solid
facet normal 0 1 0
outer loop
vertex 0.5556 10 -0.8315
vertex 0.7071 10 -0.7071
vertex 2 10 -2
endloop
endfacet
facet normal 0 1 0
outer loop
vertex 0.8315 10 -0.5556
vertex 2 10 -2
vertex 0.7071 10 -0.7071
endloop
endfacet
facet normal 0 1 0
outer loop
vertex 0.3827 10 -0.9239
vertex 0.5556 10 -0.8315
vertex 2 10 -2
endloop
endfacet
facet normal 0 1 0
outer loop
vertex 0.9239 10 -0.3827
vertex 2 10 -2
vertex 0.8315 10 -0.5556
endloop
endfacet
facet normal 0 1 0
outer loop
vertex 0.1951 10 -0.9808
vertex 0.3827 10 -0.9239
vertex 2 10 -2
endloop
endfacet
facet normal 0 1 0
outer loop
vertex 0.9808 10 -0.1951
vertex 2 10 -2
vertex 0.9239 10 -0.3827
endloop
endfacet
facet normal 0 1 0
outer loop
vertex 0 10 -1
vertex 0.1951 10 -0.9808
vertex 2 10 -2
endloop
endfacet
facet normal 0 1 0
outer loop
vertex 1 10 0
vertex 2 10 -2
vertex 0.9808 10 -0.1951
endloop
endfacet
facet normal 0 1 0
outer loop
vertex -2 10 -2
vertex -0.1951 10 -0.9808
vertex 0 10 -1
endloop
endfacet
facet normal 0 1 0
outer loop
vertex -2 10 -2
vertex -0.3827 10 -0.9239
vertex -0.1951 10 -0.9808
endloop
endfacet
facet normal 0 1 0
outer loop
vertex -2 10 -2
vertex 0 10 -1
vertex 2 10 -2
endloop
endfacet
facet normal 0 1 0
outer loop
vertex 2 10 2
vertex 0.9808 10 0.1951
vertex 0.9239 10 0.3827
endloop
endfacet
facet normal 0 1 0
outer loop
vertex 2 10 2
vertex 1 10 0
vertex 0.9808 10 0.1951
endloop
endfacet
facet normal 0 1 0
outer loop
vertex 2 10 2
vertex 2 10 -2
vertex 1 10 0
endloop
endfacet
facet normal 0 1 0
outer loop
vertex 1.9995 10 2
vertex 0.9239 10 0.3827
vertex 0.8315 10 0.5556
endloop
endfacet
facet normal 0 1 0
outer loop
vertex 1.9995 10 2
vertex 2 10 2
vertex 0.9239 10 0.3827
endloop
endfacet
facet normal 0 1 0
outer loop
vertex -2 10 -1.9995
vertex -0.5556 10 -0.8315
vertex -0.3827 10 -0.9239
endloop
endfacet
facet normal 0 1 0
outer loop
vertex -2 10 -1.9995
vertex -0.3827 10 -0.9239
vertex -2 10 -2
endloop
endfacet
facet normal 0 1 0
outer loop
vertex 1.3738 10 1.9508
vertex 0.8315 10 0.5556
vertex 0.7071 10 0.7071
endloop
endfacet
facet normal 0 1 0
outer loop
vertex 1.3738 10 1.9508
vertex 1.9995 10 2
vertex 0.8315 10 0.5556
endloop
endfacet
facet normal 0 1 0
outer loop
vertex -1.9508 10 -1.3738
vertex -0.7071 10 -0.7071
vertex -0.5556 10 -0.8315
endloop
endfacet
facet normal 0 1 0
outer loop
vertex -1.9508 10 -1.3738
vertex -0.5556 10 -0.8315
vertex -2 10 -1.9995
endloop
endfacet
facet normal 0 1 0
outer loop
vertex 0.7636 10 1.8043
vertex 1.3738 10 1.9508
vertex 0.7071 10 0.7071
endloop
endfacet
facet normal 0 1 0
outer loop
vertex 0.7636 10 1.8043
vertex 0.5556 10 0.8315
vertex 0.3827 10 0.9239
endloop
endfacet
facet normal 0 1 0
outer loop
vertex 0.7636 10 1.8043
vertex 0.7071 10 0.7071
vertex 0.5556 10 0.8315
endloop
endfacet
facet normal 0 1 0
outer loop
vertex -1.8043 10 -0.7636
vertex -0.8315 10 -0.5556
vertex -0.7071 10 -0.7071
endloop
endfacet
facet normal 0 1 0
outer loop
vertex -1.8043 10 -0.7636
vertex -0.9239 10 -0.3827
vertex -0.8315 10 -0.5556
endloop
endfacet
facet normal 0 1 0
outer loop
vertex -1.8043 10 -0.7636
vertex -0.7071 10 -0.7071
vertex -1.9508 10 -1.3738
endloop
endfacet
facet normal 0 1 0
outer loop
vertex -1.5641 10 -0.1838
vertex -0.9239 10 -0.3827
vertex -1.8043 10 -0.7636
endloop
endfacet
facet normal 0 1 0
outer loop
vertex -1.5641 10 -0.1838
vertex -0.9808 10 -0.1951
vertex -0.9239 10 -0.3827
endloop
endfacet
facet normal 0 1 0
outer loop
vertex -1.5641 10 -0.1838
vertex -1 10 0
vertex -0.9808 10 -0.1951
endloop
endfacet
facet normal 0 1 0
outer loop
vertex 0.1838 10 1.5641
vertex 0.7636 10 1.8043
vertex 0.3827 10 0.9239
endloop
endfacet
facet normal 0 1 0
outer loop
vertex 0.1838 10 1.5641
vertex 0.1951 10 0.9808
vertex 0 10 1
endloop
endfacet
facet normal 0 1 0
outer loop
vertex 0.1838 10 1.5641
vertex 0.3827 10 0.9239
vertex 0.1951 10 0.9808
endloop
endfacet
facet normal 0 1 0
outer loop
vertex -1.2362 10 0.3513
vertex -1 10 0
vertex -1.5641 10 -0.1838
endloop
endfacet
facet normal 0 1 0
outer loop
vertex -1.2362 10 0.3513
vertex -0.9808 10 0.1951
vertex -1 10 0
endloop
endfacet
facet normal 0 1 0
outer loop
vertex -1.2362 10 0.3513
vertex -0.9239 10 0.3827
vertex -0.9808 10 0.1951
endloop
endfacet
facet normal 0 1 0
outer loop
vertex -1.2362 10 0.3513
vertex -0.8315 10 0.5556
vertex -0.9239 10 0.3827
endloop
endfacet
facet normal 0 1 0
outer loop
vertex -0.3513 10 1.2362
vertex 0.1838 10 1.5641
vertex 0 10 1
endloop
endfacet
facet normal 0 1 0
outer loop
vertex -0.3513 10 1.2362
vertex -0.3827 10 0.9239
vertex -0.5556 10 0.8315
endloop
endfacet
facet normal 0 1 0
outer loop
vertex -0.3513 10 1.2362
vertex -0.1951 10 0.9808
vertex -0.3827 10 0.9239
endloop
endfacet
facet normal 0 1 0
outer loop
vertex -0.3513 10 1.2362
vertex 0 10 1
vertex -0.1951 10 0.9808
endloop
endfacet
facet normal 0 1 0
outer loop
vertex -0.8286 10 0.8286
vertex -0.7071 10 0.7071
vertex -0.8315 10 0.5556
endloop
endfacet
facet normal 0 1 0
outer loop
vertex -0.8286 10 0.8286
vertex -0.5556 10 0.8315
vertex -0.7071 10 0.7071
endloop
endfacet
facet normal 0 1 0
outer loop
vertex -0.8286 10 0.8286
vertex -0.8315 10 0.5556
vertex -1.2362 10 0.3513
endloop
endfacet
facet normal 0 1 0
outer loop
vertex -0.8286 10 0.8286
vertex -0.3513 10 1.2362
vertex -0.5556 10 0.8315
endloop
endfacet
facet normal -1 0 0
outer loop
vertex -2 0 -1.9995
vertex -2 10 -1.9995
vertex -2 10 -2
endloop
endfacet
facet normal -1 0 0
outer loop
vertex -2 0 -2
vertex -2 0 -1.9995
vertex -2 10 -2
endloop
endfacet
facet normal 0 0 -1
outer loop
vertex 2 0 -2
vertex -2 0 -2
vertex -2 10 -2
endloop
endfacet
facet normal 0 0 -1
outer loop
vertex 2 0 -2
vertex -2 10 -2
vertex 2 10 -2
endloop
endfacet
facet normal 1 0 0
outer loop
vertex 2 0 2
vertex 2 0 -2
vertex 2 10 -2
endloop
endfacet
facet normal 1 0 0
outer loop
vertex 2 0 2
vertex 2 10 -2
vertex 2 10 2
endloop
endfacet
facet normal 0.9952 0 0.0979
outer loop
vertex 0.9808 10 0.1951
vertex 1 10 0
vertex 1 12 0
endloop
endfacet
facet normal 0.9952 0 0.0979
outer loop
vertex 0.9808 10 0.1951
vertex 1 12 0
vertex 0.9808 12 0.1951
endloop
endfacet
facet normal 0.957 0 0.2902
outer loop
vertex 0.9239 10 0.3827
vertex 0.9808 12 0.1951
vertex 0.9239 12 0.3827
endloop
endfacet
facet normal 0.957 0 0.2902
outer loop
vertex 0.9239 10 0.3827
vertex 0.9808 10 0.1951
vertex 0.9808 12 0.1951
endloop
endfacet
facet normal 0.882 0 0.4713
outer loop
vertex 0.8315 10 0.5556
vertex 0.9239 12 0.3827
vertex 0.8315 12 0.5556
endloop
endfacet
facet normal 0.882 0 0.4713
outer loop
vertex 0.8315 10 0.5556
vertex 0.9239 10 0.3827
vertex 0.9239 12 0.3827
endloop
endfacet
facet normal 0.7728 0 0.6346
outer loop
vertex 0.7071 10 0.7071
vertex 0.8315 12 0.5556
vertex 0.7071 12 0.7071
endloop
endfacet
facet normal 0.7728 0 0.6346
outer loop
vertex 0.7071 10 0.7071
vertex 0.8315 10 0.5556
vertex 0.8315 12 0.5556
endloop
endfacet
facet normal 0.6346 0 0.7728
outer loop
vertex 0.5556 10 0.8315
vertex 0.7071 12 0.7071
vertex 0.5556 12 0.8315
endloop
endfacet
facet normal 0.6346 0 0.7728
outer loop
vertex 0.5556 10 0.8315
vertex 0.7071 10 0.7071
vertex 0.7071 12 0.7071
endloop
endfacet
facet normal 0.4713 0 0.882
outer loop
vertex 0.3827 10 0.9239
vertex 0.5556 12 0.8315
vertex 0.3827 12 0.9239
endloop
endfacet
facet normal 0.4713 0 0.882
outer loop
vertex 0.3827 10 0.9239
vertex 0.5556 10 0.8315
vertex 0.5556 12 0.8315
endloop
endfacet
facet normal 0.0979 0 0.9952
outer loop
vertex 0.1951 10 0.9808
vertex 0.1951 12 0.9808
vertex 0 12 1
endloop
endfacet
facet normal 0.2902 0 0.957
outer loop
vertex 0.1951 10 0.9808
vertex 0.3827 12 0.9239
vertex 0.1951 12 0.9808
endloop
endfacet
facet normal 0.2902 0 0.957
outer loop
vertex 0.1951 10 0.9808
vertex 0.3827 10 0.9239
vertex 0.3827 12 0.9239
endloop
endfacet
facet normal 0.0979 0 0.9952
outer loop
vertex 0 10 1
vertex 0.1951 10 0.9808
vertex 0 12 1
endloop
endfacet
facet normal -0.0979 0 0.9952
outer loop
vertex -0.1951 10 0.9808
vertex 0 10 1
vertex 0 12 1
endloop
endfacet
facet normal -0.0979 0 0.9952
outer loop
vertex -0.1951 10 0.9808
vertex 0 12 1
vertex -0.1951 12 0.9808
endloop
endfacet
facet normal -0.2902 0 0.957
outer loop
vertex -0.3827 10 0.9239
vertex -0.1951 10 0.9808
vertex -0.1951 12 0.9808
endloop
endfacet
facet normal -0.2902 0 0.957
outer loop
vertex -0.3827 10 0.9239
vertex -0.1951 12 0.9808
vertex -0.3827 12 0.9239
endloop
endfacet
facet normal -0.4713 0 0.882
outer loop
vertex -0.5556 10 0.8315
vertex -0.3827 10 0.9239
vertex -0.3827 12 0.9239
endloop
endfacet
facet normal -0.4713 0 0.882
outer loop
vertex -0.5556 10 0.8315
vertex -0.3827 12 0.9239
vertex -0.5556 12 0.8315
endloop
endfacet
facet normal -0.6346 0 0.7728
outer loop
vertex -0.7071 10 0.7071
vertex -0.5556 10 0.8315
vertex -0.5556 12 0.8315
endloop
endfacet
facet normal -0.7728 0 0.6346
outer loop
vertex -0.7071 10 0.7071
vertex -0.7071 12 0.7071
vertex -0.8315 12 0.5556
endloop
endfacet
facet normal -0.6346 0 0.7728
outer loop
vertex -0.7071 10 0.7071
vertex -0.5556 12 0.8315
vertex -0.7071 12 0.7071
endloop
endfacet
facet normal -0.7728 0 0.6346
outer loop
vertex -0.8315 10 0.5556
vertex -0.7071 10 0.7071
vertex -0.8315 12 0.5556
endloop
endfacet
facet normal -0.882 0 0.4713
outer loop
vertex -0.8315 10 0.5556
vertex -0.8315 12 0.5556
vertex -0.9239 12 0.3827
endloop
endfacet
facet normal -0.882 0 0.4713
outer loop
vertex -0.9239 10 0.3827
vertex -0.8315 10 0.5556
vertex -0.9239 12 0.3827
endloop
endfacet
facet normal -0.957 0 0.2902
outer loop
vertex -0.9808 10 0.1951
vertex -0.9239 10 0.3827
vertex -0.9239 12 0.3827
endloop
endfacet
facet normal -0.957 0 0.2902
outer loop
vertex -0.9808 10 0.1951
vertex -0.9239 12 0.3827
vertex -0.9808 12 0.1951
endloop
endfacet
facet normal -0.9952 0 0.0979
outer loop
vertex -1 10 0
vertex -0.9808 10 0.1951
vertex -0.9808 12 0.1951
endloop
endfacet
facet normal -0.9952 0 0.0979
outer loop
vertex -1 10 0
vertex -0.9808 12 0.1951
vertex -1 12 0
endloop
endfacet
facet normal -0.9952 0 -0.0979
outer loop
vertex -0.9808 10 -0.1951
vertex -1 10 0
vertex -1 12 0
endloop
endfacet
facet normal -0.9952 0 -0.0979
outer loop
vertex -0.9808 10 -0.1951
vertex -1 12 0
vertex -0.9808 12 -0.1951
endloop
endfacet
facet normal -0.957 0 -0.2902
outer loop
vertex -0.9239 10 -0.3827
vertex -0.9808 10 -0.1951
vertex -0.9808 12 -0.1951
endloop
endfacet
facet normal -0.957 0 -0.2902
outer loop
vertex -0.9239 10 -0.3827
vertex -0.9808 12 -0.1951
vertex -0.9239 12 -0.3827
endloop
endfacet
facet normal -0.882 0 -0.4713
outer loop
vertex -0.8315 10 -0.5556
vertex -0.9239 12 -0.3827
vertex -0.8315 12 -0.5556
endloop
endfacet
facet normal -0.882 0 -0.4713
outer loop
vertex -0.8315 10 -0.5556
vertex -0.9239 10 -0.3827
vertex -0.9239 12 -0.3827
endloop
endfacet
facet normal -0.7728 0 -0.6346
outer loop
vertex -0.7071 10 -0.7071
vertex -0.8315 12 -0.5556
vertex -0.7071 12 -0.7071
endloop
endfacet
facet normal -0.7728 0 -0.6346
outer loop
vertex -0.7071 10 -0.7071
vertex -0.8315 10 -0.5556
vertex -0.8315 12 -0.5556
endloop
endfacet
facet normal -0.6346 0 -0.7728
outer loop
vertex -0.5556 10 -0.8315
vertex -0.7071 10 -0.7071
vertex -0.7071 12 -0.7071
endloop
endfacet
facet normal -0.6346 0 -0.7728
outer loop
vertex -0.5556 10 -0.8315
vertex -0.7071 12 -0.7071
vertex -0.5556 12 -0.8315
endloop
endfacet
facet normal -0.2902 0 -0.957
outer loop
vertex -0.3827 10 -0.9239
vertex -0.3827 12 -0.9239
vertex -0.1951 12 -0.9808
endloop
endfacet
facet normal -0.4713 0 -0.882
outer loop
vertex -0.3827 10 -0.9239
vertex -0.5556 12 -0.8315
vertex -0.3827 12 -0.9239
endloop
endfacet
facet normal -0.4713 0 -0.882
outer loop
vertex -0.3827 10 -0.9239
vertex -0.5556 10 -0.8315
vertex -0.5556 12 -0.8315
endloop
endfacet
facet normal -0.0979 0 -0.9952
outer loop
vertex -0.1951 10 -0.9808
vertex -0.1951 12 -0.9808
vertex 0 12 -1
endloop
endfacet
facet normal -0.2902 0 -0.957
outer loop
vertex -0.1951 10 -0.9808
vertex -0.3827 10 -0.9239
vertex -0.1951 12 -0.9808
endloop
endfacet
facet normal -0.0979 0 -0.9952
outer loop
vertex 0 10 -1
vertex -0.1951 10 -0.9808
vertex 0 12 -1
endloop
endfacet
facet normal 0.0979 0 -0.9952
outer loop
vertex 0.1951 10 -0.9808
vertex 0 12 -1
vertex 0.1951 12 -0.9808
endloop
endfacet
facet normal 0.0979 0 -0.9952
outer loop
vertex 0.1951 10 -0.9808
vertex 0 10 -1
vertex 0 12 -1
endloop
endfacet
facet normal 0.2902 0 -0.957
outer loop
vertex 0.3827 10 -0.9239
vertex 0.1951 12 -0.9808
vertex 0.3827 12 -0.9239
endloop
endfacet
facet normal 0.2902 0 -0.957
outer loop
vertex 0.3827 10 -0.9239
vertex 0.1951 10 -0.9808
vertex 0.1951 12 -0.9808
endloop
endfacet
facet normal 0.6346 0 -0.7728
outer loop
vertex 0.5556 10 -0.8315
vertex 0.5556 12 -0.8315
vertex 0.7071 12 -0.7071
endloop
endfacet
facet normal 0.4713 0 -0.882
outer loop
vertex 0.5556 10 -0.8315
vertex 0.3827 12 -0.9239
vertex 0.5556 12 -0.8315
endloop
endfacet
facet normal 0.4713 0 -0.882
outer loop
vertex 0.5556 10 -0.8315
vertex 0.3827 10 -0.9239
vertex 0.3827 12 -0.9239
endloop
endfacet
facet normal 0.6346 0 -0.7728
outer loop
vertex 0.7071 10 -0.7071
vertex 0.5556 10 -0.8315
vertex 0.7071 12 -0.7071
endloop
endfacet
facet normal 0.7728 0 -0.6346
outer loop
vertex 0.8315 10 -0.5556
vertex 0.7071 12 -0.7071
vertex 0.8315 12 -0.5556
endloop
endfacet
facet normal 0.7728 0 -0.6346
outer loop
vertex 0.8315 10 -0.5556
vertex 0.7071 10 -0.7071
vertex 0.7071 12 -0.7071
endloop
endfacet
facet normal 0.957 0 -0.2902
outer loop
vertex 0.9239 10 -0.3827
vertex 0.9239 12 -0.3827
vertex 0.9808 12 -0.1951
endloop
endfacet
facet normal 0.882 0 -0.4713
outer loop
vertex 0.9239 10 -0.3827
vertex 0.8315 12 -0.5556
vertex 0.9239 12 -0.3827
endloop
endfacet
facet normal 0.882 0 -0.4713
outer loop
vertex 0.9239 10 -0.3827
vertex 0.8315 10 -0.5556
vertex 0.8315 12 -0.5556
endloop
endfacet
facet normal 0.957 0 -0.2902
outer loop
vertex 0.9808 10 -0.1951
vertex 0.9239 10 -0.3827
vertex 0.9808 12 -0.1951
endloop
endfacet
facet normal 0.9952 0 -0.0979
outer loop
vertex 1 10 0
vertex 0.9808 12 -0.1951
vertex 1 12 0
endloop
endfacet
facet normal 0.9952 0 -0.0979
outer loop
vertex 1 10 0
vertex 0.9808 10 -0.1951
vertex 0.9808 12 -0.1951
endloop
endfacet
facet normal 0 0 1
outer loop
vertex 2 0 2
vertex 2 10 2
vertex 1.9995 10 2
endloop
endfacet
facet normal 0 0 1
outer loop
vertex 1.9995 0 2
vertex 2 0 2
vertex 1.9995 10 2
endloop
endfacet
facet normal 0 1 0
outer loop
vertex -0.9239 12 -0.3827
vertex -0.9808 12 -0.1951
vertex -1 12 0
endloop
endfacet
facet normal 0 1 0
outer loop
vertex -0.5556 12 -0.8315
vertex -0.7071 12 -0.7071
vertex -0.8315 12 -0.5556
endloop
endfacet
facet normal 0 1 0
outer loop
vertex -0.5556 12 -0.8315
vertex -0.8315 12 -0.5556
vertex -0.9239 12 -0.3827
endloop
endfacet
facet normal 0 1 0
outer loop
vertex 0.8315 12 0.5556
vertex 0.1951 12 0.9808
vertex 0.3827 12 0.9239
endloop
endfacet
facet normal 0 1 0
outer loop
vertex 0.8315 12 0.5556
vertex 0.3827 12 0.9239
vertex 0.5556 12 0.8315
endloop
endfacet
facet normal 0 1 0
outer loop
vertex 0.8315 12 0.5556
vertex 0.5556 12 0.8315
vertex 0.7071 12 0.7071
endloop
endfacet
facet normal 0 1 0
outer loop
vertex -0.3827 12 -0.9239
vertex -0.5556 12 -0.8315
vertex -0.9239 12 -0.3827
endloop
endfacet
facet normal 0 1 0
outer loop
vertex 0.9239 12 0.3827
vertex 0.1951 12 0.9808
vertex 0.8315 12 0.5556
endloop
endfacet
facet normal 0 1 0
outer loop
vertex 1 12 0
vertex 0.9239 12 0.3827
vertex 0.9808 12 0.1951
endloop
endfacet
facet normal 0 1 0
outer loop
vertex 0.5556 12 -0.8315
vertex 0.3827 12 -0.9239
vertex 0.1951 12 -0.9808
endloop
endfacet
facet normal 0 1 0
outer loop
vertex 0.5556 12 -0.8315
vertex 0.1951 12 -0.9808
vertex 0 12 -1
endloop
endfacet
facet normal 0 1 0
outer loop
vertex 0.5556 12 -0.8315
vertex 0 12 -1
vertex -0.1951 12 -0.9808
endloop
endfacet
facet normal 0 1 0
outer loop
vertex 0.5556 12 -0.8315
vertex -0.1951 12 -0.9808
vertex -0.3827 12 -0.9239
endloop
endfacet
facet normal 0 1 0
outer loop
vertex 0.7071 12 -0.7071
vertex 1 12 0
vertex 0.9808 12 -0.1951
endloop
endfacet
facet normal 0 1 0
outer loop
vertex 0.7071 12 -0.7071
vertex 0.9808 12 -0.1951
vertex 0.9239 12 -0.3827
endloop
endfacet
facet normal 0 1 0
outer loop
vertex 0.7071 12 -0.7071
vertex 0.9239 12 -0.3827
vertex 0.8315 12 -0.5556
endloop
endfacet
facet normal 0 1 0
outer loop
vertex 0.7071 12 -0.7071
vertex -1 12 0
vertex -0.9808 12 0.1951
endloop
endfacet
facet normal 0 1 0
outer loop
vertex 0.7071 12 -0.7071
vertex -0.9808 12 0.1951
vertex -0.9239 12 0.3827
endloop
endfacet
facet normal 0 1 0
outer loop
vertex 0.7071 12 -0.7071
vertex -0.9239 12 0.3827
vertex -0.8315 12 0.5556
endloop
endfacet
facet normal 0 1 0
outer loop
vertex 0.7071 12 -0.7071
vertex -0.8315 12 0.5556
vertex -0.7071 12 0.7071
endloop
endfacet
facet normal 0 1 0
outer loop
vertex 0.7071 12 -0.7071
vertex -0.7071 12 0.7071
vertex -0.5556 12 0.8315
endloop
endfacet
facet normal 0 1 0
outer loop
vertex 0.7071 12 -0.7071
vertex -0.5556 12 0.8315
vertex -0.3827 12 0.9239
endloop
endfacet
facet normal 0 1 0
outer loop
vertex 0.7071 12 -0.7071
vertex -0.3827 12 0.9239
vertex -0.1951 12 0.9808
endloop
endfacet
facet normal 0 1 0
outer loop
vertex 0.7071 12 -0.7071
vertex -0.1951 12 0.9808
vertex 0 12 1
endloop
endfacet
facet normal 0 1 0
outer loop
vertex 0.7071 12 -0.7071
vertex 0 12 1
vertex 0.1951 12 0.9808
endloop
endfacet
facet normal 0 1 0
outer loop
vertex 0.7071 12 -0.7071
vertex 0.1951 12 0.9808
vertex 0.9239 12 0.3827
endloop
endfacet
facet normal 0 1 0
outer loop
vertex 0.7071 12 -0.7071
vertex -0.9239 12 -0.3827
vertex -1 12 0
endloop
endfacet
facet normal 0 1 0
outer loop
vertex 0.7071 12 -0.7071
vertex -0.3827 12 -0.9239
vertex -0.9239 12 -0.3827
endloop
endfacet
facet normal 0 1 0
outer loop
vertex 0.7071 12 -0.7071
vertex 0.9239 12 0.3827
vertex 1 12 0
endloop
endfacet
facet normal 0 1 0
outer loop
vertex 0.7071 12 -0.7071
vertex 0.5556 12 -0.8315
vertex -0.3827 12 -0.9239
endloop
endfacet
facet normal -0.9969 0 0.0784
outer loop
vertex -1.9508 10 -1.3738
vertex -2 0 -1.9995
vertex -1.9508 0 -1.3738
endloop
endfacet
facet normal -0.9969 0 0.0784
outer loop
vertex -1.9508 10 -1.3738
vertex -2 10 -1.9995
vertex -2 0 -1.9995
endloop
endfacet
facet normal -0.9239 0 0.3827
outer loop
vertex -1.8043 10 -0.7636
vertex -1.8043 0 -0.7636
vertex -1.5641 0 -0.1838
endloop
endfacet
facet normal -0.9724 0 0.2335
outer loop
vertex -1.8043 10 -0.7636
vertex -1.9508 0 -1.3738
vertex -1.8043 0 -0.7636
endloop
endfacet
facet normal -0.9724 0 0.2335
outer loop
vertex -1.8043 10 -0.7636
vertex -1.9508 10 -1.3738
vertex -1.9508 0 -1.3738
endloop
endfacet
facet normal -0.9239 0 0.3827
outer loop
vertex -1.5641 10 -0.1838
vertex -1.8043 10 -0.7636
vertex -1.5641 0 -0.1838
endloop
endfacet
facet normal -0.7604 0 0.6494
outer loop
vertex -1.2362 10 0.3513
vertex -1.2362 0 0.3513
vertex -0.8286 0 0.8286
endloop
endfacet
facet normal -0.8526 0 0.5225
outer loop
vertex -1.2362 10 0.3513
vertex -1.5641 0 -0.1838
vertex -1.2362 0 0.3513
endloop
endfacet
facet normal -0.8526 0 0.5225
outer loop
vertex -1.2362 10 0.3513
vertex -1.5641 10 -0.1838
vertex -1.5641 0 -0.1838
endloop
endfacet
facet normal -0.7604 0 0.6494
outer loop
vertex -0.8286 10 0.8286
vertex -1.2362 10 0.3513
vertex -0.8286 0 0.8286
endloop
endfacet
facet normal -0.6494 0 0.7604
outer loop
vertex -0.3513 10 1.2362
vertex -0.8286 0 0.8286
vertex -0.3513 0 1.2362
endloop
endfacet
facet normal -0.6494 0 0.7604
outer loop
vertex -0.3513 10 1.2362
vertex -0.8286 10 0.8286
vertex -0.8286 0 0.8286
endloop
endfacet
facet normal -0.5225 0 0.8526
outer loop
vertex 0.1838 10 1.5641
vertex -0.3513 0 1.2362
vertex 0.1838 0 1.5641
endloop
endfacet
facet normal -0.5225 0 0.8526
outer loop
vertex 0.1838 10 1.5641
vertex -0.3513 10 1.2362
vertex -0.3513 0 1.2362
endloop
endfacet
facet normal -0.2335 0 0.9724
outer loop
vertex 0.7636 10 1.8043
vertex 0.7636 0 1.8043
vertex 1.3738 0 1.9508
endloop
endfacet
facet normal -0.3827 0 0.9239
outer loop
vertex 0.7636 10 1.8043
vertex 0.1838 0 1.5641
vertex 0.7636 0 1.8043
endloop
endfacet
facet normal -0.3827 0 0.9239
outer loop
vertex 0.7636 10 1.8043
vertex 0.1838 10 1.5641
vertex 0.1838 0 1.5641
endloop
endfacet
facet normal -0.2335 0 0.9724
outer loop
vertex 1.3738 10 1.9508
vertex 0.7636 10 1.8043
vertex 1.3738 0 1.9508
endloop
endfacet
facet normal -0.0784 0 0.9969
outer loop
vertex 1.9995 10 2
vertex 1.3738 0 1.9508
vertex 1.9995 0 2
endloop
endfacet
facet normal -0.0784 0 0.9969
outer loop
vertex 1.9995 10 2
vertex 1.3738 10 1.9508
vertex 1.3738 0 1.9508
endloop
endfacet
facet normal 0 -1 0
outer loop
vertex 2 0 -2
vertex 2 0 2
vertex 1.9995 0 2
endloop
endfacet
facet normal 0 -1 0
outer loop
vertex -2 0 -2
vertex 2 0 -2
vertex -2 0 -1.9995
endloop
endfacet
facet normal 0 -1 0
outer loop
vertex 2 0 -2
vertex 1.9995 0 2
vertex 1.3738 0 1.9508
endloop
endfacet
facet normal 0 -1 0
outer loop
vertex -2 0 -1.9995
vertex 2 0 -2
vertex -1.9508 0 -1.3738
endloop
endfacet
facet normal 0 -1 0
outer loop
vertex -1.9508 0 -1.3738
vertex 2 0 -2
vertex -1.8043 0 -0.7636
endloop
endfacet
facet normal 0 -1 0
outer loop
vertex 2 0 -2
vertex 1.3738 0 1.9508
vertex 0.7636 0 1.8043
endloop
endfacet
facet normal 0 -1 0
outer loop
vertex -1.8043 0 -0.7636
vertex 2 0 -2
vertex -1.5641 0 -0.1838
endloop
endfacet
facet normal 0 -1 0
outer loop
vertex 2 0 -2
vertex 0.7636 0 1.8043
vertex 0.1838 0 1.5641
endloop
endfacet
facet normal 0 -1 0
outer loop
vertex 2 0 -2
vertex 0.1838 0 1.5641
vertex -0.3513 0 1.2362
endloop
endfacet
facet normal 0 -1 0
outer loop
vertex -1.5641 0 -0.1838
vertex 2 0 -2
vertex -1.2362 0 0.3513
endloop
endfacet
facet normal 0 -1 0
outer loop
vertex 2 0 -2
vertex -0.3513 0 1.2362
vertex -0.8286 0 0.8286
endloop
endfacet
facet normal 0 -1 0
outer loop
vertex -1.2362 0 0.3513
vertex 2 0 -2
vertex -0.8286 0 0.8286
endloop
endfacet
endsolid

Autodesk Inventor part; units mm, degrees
ref_plane "YZ Plane" through (0, 0, 0) normal (1, 0, 0) x (0, 1, 0)
ref_plane "XZ Plane" through (0, 0, 0) normal (0, 1, 0) x (-1, 0, 0)
ref_plane "XY Plane" through (0, 0, 0) normal (0, 0, 1) x (1, 0, 0)
sketch "Szkic1" plane through (0, 0, 0) normal (0, 1, 0) x (-1, 0, 0)
  line L0 (-2, 2) -> (2, 2)
  line L1 (2, 2) -> (2, -2)
  line L2 (2, -2) -> (-2, -2)
  line L3 (-2, -2) -> (-2, 2)
  line L4 (-2, 2) -> (2, -2) construction
  line L5 (2, 2) -> (-2, -2) construction
  point P0 (0, 0)
  dimension "d0" = 4
  dimension "d1" = 4
extrude "Wyciągnięcie proste1" add sketch "Szkic1" along normal blind 10
fillet "Zaokrąglenie1" radius 4 1 edges at (-2, 5, 2)
sketch "Szkic2" plane through (0, 10, 0) normal (0, 1, 0) x (1, 0, 0)
  circle A0 centre (0, 0) radius 1
  dimension "d5" = 2
extrude "Wyciągnięcie proste2" add sketch "Szkic2" along normal blind 2
properties part number "FanLegs"
